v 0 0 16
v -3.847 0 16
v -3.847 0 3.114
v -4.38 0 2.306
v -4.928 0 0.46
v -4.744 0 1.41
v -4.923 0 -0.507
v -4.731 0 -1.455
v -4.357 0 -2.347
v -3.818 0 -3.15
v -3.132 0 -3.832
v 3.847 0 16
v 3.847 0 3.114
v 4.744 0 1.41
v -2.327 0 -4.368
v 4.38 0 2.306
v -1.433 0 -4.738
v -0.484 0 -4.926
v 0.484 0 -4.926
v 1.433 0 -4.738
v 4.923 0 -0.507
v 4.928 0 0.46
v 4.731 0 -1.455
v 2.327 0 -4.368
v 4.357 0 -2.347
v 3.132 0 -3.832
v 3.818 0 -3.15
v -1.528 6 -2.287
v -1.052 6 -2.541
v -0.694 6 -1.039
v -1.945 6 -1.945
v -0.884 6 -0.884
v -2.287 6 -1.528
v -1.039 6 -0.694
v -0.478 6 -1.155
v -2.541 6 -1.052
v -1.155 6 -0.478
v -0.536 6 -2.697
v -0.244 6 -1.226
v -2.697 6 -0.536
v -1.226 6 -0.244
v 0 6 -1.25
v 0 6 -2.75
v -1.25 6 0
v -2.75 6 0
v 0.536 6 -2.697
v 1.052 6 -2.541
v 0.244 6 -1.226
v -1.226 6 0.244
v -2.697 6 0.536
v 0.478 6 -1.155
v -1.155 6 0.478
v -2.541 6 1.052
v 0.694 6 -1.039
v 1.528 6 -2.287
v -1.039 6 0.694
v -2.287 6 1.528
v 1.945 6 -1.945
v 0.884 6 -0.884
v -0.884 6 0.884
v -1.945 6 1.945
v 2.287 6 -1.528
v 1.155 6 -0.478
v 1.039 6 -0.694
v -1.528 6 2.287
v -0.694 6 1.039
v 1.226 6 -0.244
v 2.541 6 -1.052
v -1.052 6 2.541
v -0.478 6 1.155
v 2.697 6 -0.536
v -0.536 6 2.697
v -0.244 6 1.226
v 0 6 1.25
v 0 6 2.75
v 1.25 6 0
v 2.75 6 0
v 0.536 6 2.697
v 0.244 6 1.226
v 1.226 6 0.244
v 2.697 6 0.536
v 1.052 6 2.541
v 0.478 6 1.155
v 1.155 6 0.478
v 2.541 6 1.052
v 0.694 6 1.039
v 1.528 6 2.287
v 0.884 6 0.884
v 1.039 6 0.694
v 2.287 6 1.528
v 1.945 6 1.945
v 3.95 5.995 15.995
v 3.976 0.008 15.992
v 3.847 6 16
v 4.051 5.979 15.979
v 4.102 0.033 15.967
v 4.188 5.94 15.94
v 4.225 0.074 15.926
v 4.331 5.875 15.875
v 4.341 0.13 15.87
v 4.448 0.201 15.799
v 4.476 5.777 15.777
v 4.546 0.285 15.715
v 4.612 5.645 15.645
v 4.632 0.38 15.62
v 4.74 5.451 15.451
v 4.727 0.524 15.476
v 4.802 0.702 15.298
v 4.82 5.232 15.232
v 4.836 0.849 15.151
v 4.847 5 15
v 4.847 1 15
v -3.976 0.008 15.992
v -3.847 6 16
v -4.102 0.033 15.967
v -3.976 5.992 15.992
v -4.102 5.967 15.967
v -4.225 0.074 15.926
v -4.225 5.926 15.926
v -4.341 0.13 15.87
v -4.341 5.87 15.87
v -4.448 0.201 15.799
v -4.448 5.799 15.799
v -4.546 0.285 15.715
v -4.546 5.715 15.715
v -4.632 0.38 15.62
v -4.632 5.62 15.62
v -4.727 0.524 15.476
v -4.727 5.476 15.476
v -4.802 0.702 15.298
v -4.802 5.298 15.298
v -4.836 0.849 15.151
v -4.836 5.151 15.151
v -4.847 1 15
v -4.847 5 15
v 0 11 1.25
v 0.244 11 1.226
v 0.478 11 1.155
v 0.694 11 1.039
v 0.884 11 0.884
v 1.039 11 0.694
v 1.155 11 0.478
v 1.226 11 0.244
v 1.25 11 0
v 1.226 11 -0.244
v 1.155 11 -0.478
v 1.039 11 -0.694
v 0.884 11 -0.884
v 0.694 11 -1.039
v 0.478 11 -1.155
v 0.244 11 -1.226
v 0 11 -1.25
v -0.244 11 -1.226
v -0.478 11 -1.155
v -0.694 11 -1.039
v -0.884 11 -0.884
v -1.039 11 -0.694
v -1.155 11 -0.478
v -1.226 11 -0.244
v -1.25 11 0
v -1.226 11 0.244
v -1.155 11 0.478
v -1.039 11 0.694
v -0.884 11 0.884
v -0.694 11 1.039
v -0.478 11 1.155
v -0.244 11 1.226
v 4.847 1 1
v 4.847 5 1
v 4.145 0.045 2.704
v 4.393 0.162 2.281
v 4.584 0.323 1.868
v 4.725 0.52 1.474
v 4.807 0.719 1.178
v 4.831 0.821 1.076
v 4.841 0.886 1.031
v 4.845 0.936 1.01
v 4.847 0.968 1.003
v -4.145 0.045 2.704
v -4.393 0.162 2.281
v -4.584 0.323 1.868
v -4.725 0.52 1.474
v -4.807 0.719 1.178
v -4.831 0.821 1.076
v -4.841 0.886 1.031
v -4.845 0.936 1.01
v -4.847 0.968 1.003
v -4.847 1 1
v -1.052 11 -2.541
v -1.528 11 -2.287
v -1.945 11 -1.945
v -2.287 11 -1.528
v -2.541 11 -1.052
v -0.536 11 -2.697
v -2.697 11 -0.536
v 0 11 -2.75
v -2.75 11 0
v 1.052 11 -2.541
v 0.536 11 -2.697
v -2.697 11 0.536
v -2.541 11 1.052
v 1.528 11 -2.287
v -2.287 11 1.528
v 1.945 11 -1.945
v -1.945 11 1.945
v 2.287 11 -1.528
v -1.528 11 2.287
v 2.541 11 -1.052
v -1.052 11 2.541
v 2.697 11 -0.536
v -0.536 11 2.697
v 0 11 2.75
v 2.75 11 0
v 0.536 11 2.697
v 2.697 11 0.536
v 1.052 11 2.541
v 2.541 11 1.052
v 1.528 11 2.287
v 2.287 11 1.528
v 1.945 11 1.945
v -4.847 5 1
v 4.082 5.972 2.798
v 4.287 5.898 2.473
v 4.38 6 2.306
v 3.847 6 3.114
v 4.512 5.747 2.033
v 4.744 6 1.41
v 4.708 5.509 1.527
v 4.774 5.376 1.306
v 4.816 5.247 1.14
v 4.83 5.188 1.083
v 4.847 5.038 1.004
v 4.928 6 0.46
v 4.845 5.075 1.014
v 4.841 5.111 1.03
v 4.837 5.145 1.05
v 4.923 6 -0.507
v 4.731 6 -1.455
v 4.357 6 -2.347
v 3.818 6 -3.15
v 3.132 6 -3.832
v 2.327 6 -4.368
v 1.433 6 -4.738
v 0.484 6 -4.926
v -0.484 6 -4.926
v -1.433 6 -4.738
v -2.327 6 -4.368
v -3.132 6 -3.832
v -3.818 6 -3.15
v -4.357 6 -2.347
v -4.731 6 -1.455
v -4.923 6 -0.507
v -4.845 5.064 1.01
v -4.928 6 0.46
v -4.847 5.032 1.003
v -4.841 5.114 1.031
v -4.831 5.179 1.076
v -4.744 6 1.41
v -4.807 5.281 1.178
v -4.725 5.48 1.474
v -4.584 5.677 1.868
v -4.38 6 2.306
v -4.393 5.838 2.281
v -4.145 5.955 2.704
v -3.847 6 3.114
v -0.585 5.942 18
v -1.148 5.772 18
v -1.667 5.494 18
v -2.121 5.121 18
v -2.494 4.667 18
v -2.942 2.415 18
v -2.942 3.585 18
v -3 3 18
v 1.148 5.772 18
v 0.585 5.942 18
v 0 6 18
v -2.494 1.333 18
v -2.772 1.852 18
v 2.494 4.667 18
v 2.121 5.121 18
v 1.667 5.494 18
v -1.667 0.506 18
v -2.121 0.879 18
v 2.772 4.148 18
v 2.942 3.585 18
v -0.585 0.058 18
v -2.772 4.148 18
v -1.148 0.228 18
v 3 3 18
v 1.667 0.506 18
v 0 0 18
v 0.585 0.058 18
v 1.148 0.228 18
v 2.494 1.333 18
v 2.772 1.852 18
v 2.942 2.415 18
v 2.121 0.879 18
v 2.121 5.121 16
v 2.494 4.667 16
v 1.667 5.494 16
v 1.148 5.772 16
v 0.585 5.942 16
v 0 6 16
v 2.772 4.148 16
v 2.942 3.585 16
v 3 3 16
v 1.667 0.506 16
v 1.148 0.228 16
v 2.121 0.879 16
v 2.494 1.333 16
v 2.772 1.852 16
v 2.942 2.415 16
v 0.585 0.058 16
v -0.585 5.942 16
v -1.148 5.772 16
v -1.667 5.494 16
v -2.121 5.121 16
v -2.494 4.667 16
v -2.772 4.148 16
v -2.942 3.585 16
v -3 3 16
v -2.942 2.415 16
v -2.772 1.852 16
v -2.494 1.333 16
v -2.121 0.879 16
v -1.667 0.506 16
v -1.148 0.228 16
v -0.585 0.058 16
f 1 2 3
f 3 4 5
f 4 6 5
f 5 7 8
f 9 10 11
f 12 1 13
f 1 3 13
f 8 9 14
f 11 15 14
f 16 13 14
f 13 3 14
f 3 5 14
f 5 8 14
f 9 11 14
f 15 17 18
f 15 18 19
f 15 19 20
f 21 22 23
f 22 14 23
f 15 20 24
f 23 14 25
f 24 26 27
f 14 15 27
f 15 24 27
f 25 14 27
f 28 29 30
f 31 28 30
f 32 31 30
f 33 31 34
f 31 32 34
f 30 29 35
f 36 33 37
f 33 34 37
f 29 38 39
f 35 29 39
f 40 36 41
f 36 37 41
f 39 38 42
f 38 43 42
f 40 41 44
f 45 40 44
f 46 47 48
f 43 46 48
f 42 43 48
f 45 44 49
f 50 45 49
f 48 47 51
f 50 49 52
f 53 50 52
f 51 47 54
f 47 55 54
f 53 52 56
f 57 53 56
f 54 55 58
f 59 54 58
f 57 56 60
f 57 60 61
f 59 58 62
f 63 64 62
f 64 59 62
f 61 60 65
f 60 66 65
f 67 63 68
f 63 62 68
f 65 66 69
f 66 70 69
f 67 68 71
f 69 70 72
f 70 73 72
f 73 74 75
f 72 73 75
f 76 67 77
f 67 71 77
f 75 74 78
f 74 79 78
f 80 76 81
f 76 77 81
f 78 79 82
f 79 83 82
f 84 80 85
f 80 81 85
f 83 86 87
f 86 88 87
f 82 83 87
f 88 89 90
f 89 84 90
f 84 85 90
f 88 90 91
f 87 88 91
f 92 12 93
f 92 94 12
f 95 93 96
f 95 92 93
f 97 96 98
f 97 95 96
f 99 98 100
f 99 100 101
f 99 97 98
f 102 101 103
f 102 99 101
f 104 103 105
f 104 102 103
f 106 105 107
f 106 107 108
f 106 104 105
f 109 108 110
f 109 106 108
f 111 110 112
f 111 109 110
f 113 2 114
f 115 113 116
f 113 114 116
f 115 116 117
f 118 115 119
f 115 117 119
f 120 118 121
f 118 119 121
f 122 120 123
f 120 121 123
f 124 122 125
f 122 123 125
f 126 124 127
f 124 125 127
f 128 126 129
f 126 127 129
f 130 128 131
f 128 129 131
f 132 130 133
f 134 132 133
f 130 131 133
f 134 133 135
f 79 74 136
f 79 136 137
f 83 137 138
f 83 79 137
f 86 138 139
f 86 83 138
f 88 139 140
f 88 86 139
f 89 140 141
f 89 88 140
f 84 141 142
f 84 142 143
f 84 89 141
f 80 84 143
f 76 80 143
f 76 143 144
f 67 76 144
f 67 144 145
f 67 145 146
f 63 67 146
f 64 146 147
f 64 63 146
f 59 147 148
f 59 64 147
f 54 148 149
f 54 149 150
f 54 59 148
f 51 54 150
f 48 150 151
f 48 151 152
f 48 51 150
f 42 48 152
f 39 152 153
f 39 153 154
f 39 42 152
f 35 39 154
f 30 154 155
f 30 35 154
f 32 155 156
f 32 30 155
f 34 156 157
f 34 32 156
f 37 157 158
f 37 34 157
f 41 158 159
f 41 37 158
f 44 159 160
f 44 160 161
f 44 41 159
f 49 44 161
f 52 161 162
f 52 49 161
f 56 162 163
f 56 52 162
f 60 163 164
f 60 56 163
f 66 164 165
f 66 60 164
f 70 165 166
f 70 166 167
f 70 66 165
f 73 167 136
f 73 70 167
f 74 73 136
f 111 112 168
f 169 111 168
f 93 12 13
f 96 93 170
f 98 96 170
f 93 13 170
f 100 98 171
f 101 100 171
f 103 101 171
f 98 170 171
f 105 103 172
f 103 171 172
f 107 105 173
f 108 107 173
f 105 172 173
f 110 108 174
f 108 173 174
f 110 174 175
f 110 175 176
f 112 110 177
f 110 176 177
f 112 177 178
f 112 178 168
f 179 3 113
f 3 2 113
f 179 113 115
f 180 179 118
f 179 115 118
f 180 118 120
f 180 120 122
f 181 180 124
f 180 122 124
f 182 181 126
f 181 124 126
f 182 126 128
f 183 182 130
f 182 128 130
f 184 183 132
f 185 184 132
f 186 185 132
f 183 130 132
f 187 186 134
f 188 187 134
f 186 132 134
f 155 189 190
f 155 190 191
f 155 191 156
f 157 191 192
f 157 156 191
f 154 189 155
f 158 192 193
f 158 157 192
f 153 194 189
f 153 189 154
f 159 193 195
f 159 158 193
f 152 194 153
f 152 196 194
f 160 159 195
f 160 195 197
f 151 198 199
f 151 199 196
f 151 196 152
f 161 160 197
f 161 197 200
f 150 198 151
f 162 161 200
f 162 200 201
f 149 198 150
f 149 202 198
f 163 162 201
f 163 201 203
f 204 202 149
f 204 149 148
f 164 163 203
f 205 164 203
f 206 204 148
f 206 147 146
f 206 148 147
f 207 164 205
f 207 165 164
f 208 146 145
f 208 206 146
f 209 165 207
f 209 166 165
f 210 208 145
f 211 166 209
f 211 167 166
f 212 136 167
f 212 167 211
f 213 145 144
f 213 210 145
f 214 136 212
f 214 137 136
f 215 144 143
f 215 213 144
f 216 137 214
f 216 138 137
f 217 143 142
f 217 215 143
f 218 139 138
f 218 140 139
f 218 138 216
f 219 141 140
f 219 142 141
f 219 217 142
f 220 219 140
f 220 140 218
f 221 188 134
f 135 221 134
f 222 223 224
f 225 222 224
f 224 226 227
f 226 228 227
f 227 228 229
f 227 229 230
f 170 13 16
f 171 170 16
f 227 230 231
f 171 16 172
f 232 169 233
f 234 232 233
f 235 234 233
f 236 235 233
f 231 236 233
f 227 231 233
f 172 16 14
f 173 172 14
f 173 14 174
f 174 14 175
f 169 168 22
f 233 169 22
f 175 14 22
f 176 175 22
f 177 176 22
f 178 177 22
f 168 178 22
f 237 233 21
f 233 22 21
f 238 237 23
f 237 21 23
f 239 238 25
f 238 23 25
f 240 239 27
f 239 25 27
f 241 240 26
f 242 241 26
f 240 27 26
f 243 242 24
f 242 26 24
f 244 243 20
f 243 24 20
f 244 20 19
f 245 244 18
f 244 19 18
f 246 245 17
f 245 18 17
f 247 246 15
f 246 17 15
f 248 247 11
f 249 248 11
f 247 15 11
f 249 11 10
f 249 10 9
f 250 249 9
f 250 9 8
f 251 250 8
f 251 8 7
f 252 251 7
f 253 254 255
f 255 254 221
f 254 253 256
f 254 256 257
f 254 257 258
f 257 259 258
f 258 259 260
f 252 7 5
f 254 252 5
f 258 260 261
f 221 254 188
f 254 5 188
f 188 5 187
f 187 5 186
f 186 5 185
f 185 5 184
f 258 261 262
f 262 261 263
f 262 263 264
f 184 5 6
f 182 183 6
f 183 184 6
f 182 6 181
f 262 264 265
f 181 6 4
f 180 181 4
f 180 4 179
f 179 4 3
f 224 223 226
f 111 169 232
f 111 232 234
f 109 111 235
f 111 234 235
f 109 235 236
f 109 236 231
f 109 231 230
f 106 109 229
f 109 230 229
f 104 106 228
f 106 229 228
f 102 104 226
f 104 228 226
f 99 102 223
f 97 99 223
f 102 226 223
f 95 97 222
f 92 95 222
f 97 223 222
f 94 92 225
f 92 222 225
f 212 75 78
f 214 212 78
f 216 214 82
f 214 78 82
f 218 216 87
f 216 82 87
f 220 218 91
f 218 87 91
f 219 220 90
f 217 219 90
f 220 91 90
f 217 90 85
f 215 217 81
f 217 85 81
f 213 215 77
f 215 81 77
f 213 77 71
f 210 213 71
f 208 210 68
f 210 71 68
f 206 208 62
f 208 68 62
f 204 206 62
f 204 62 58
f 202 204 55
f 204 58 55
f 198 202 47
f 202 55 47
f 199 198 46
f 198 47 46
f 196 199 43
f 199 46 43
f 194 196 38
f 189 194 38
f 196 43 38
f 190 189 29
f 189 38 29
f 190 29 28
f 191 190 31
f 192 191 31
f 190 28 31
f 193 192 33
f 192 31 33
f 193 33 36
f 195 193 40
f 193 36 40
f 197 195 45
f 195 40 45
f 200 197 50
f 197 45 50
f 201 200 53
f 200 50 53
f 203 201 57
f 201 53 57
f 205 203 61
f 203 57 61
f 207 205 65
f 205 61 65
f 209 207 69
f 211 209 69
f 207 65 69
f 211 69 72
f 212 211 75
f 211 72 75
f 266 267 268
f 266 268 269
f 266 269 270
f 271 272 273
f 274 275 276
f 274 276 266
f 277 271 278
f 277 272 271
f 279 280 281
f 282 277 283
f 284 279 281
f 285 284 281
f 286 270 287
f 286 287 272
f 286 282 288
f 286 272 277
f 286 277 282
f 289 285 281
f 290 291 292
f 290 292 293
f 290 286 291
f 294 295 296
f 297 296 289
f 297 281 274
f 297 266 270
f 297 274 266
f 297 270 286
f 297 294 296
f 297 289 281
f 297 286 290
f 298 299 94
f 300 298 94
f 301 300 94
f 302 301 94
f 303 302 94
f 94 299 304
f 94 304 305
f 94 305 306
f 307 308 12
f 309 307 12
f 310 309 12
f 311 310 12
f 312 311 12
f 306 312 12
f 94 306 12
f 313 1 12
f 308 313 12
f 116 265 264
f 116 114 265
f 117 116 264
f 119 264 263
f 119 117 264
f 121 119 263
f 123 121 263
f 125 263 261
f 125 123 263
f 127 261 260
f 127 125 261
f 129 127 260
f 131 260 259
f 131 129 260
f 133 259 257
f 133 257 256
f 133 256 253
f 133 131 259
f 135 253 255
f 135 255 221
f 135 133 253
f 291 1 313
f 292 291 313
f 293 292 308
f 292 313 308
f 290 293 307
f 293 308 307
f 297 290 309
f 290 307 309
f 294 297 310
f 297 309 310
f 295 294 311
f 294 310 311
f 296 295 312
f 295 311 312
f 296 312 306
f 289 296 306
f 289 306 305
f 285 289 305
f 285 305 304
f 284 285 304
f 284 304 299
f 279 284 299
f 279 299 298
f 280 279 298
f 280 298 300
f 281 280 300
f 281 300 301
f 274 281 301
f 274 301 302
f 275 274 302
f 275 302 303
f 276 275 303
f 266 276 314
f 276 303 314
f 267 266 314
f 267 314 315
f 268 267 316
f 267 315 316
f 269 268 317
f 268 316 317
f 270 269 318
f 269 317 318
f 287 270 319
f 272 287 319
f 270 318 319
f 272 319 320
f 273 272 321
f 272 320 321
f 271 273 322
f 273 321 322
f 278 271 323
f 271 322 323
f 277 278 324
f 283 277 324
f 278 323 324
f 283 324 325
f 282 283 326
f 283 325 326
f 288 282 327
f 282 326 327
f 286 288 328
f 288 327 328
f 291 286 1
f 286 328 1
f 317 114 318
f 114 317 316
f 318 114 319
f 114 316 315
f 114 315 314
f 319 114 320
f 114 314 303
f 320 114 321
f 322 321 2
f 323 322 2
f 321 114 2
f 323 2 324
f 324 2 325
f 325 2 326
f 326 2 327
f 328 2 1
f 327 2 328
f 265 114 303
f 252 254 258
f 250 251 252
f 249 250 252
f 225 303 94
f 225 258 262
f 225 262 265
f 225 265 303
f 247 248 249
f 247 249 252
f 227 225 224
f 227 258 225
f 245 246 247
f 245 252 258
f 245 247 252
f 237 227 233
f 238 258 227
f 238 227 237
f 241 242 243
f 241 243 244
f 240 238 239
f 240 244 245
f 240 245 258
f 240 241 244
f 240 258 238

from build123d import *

# Parameters (mm, degrees)
EXTRUDE_1_DEPTH = 6
SKETCH_2_R      = 2.75
SKETCH_2_R_2    = 1.25
EXTRUDE_2_DEPTH = 5
SKETCH_3_R      = 3
EXTRUDE_3_DEPTH = 2
FILLET_1_R      = 1


with BuildPart() as part:
    # 草图1 → 凸台-拉伸1 (new body)
    with BuildSketch(Plane(origin=(0, 0, 0), x_dir=(1, 0, 0), z_dir=(0, 1, 0))):
        with BuildLine():
            Line((-4.847365484, -1), (-4.847365484, -16))
            Line((-4.847365484, -16), (4.847365484, -16))
            Line((4.847365484, -16), (4.847365484, -1))
            ThreePointArc((4.847365484, -1), (0, 4.949439578), (-4.847365484, -1))
        make_face()
    extrude(amount=EXTRUDE_1_DEPTH)

    # 草图3 → 凸台-拉伸3 (add)
    with BuildSketch(Plane.XY.offset(16)):
        with Locations(Location((0, 3, 0), (0, 0, 270))):
            Circle(SKETCH_3_R)
    extrude(amount=EXTRUDE_3_DEPTH)

    # 圆角1
    fillet_1_edges = [part.edges().sort_by_distance(p)[0] for p in [
        (-4.847365484, 6, 8.5),
        (4.847365484, 6, 8.5),
        (-4.847365484, 0, 8.5),
        (4.847365484, 0, 8.5),
        (-4.847365484, 3, 16),
        (4.847365484, 3, 16),
    ]]
    fillet(fillet_1_edges, radius=FILLET_1_R)


with BuildPart() as body_2:
    # 草图2 → 凸台-拉伸2 (new body)
    with BuildSketch(Plane(origin=(0, 6, 0), x_dir=(1, 0, 0), z_dir=(0, 1, 0))):
        with Locations(Location((0, 0, 0), (0, 0, 270))):
            Circle(SKETCH_2_R)
        with Locations(Location((0, 0, 0), (0, 0, 270))):
            Circle(SKETCH_2_R_2, mode=Mode.SUBTRACT)
    extrude(amount=EXTRUDE_2_DEPTH)


solid = Compound([part.part, body_2.part])
